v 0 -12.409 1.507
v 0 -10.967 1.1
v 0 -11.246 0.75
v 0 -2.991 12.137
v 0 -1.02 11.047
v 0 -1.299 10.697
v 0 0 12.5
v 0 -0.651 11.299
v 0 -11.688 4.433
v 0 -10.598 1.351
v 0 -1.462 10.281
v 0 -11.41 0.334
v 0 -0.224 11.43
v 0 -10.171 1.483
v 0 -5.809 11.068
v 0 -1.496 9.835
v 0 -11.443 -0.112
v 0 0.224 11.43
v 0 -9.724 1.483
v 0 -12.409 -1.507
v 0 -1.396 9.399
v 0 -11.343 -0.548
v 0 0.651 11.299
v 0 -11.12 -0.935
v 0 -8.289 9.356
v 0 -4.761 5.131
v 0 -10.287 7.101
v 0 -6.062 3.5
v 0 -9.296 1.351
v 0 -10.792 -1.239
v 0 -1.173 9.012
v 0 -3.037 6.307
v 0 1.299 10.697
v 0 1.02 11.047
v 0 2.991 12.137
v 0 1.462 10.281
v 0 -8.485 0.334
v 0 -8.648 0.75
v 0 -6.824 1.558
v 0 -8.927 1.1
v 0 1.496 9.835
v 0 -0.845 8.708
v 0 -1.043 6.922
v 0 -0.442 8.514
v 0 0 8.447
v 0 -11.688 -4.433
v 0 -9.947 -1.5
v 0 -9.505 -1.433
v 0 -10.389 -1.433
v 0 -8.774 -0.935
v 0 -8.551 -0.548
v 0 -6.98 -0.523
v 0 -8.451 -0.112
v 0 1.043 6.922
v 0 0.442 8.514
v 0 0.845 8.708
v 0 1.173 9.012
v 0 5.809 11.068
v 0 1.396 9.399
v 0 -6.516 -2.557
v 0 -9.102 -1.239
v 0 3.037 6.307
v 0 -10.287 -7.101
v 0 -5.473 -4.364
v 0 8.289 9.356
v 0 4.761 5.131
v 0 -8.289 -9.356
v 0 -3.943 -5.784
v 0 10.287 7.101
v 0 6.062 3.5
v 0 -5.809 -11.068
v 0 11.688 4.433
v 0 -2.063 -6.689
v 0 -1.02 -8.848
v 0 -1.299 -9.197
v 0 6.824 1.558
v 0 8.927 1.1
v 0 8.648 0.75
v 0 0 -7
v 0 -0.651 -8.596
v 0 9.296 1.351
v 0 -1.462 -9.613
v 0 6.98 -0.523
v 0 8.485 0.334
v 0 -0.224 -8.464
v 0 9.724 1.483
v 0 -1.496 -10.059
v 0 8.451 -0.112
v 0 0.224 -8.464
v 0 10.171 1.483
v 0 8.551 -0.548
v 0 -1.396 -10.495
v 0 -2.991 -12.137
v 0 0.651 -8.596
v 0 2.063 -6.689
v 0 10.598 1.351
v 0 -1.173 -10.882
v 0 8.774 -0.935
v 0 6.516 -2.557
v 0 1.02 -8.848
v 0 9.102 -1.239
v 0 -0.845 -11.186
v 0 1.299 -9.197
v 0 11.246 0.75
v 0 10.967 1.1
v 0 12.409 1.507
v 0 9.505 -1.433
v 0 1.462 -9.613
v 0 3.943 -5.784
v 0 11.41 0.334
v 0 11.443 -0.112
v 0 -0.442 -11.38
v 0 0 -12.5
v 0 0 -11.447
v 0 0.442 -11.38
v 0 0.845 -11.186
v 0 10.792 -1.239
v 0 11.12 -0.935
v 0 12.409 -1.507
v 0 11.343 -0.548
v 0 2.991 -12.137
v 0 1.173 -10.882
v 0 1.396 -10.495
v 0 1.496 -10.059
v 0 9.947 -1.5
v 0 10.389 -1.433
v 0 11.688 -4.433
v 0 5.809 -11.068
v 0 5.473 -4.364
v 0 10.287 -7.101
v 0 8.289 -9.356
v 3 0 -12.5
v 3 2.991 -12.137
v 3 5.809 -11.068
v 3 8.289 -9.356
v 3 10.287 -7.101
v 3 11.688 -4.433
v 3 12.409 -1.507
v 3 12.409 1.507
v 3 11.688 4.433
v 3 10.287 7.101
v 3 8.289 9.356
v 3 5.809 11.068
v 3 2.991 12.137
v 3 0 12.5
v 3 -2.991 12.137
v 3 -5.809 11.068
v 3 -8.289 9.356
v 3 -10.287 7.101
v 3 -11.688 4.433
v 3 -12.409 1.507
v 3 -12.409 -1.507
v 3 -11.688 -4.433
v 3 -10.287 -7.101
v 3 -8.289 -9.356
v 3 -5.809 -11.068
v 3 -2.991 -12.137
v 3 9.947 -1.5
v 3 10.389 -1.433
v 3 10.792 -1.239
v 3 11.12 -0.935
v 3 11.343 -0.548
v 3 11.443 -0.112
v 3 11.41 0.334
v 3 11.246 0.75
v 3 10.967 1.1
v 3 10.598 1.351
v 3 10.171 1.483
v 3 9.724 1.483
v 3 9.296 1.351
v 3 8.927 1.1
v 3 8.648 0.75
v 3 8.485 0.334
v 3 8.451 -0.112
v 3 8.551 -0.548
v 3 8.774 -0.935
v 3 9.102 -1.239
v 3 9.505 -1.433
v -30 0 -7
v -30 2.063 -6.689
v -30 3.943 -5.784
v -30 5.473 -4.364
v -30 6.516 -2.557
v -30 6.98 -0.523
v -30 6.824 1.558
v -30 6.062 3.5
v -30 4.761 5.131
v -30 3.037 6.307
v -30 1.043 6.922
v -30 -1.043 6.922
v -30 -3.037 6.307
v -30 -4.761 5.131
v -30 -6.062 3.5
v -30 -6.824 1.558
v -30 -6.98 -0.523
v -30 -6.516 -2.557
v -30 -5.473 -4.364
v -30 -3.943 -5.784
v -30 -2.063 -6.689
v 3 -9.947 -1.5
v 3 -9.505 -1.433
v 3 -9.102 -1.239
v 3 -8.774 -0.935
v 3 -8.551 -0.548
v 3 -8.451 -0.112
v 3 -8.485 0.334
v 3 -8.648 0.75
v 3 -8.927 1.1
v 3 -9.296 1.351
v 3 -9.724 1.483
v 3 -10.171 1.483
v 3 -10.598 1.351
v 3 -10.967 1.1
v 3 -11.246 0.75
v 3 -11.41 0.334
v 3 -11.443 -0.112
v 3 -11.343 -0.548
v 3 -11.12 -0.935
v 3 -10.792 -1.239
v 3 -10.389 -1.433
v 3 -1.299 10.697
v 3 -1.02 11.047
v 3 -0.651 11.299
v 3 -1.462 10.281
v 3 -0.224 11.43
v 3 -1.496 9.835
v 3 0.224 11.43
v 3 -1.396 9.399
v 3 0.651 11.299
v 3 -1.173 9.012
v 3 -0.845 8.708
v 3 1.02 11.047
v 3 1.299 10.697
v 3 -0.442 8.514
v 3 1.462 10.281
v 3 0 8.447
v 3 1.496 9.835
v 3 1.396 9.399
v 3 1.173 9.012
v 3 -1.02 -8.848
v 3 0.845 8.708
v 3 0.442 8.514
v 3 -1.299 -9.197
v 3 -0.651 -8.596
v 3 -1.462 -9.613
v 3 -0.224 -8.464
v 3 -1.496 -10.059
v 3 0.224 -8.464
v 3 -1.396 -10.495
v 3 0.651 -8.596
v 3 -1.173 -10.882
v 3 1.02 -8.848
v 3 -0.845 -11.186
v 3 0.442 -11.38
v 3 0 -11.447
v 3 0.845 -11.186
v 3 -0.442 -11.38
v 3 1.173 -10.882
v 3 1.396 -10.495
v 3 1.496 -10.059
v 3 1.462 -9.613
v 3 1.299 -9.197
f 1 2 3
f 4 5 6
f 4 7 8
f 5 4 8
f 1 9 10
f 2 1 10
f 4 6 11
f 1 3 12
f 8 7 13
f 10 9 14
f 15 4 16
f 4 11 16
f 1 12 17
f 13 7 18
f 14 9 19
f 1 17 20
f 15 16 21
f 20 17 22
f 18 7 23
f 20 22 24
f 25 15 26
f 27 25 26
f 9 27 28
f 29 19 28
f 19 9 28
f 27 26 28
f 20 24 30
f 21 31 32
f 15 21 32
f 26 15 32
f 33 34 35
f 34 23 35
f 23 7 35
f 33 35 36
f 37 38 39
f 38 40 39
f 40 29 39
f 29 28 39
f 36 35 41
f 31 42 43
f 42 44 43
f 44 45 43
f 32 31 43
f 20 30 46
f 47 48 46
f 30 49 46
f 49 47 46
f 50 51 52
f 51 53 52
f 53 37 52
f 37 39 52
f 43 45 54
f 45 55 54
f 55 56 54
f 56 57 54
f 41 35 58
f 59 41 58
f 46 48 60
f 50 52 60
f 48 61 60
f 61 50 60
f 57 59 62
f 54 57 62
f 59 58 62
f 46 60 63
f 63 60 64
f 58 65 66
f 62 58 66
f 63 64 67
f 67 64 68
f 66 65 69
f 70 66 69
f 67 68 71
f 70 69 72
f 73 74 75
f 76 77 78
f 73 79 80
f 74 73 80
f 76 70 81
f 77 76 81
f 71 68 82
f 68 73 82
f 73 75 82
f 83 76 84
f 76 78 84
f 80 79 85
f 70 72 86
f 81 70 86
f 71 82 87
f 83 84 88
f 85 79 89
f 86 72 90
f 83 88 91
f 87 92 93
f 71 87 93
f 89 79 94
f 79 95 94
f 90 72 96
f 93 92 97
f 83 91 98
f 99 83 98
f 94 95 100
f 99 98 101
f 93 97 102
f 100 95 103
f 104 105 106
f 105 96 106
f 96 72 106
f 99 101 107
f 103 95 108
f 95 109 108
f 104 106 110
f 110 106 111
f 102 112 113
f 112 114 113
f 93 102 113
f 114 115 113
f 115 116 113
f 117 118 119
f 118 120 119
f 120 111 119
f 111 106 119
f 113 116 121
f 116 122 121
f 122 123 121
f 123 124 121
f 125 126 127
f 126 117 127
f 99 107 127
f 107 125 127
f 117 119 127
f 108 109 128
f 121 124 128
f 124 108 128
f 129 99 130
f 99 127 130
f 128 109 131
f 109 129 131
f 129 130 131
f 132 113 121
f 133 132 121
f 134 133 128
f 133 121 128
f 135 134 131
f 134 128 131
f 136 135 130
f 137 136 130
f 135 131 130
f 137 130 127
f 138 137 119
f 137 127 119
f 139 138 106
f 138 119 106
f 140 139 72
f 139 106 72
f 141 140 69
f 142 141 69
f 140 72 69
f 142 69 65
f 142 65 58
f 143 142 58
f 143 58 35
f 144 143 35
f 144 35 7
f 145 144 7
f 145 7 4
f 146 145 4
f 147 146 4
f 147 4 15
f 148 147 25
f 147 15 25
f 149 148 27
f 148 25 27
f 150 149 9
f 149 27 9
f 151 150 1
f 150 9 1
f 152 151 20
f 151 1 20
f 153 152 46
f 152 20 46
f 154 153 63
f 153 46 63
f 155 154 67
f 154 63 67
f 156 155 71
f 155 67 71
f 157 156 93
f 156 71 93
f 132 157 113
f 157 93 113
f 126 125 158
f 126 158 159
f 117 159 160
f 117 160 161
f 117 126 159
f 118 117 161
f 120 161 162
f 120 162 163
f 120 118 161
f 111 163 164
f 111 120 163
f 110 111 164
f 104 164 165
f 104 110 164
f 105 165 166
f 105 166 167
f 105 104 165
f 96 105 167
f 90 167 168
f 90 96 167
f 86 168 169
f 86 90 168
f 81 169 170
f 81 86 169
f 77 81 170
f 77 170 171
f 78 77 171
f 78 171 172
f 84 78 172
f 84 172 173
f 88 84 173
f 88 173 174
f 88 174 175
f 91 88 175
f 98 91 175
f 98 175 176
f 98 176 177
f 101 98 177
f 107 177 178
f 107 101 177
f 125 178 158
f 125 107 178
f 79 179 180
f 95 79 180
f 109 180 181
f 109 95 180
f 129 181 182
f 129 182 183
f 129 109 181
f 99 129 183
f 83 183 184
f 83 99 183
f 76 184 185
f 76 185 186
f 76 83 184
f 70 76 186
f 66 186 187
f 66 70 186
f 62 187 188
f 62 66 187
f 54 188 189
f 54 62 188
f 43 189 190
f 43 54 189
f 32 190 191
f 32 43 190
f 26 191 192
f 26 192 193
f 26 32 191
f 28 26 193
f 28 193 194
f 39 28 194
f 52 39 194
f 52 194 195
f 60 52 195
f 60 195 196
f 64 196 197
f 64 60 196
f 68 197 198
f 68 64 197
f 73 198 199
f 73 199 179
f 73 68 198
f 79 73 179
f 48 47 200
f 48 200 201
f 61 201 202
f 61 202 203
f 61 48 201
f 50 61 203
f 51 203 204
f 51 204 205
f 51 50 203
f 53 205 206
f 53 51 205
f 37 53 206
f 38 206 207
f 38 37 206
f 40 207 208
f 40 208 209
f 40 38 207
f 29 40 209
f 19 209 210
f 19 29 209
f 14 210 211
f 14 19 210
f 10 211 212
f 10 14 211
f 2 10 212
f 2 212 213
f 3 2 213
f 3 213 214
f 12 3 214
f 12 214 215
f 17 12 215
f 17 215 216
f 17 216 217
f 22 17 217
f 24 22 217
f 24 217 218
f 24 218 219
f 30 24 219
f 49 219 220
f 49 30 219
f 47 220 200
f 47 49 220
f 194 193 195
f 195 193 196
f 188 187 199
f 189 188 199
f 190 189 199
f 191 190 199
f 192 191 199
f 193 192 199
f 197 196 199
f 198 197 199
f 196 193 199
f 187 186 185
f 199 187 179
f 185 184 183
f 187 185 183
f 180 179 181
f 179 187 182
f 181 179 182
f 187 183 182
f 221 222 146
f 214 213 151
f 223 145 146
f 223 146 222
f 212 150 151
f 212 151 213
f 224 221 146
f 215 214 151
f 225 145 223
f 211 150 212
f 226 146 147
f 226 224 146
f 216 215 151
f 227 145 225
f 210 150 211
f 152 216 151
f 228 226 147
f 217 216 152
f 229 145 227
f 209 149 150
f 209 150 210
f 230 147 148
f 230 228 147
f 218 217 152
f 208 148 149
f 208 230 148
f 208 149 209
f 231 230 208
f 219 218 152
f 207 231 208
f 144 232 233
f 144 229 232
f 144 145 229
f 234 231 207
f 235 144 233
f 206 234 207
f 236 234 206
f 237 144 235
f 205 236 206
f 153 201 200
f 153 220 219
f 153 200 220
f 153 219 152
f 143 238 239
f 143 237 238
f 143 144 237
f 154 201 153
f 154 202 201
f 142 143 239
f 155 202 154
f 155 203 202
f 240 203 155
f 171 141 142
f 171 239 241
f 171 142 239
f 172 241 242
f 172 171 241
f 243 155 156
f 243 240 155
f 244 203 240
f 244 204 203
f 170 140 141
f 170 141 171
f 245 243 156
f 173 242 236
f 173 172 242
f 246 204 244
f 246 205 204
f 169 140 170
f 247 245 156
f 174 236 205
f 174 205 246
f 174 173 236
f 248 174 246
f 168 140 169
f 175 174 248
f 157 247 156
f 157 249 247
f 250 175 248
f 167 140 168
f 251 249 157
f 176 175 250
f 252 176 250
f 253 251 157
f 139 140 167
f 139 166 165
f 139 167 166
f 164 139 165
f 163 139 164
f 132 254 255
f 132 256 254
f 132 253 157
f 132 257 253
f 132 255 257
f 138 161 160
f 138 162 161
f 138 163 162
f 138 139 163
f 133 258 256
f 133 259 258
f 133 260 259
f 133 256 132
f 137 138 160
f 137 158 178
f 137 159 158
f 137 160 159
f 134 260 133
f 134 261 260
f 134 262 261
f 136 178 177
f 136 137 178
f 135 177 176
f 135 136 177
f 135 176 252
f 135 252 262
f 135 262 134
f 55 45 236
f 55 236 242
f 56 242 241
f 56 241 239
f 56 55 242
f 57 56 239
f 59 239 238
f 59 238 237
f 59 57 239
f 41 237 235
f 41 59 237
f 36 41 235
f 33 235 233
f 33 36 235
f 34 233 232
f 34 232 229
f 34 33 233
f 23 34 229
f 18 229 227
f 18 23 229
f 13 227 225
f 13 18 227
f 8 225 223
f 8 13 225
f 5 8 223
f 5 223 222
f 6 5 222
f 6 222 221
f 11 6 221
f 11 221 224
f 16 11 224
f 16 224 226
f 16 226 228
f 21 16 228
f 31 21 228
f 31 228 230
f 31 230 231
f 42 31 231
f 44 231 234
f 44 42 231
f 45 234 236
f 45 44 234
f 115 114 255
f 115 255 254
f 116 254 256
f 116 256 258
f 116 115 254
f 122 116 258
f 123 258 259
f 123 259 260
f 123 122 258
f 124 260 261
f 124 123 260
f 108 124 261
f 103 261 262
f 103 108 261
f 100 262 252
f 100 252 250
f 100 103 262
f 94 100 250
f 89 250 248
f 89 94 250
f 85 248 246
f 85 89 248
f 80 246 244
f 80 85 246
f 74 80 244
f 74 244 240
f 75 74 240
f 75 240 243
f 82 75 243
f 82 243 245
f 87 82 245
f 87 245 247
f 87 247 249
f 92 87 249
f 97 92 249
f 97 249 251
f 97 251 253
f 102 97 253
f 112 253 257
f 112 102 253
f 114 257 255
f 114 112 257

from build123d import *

# Parameters (mm, degrees)
SKETCH1_R           = 7
BOSS_EXTRUDE1_DEPTH = 30
SKETCH2_R           = 12.5
SKETCH2_R_2         = 1.5
BOSS_EXTRUDE2_DEPTH = 3


with BuildPart() as part:
    # Sketch1 → Boss-Extrude1 (new body)
    with BuildSketch(Plane(origin=(0, 0, 0), x_dir=(0, 0, -1), z_dir=(1, 0, 0))):
        Circle(SKETCH1_R)
    extrude(amount=-BOSS_EXTRUDE1_DEPTH)

    # Sketch2 → Boss-Extrude2 (add)
    with BuildSketch(Plane(origin=(0, 0, 0), x_dir=(0, 0, -1), z_dir=(1, 0, 0))):
        Circle(SKETCH2_R)
        with Locations((0, 9.94711279)):
            Circle(SKETCH2_R_2, mode=Mode.SUBTRACT)
        with Locations((9.94711279, 0)):
            Circle(SKETCH2_R_2, mode=Mode.SUBTRACT)
        with Locations((0, -9.94711279)):
            Circle(SKETCH2_R_2, mode=Mode.SUBTRACT)
        with Locations((-9.94711279, 0)):
            Circle(SKETCH2_R_2, mode=Mode.SUBTRACT)
    extrude(amount=BOSS_EXTRUDE2_DEPTH)


solid = part.part
